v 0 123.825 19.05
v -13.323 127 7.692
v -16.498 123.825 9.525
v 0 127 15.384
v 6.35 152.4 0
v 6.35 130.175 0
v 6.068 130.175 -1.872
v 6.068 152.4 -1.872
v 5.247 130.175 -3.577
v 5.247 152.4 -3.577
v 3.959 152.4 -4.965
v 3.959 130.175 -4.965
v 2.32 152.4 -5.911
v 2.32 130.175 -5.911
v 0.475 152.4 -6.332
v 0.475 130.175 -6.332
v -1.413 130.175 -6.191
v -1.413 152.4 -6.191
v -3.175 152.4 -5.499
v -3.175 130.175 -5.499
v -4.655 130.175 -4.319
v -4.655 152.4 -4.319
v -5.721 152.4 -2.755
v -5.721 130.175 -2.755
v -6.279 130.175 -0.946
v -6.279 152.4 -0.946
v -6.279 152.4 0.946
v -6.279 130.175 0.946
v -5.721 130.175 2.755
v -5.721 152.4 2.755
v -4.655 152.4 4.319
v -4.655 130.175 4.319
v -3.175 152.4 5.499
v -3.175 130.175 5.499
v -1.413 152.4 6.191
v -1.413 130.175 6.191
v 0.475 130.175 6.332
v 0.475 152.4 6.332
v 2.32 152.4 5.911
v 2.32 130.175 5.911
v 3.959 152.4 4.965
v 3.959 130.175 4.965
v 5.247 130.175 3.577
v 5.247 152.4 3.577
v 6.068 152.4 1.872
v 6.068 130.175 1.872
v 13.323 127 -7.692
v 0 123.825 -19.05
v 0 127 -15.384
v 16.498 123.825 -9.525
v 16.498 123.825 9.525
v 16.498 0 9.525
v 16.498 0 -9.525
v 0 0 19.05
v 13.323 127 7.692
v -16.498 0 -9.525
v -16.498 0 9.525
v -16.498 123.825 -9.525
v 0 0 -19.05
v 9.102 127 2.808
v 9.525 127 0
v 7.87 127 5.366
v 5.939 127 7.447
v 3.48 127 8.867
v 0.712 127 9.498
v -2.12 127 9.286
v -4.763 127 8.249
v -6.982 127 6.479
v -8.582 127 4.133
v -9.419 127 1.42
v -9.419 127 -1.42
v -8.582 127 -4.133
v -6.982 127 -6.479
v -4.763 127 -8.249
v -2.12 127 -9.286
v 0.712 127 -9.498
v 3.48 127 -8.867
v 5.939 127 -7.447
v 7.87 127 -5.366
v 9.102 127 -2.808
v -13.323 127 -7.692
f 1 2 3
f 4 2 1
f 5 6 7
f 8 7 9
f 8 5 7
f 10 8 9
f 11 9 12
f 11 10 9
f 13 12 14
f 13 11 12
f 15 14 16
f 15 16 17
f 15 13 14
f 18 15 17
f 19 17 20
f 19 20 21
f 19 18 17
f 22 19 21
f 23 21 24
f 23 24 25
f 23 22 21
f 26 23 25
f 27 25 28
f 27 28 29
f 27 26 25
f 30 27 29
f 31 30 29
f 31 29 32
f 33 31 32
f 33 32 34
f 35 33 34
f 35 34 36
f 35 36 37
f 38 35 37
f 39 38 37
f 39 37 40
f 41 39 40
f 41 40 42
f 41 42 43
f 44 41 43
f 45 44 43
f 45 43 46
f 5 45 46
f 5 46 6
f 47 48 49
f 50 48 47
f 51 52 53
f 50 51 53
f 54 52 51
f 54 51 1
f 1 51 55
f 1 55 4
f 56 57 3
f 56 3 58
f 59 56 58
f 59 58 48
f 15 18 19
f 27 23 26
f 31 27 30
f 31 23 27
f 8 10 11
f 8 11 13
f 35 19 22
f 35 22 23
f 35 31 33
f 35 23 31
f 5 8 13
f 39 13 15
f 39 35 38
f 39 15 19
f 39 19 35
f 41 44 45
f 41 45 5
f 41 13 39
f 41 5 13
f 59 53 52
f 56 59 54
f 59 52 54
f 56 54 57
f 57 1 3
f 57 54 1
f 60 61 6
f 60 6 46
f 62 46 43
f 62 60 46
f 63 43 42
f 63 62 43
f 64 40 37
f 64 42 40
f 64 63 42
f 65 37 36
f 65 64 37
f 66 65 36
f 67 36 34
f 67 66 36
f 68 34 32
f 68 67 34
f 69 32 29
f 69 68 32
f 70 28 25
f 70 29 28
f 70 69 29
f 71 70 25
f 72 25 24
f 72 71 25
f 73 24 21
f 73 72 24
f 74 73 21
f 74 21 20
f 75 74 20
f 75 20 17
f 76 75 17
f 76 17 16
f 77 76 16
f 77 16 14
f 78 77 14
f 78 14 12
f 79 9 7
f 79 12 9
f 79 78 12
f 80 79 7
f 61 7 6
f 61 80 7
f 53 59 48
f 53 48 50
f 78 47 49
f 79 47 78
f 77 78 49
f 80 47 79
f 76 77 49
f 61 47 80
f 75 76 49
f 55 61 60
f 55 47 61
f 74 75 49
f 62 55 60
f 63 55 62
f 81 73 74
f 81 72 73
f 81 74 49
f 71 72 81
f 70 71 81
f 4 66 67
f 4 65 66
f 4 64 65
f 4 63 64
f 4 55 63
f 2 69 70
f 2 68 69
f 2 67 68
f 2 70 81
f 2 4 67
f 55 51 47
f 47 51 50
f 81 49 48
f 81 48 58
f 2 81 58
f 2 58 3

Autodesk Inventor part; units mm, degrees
ref_plane "YZ Plane" through (0, 0, 0) normal (1, 0, 0) x (0, 1, 0)
ref_plane "XZ Plane" through (0, 0, 0) normal (0, 1, 0) x (-1, 0, 0)
sketch "Sketch1" plane through (0, 0, 0) normal (0, 1, 0) x (-1, 0, 0)
  line L0 (16.4978, 9.525) -> (16.4978, -9.525)
  line L1 (16.4978, -9.525) -> (0, -19.05)
  line L2 (0, -19.05) -> (-16.4978, -9.525)
  line L3 (-16.4978, 9.525) -> (-16.4978, -9.525)
  line L4 (-16.4978, 9.525) -> (0, 19.05)
  line L5 (0, 19.05) -> (16.4978, 9.525)
  circle A0 centre (0, 0) radius 19.05 construction
  line L6 (0, 25.4) -> (0, -25.4) construction
  circle A1 centre (0, 0) radius 6.35
  dimension "d0" = 38.1
  dimension "d8" = 12.7
extrude "Hexagon1" add sketch "Sketch1" along normal blind 127 contours L0 L1 L2 L3 L4 L5 | A1
sketch "Sketch2" plane through (0, 127, 0) normal (0, 1, 0) x (1, 0, 0)
  circle A0 centre (0, 0) radius 6.35
  line L0 (0, 0) -> (25.4, 0) construction
  dimension "d3" = 12.7
ref_plane "Work Plane2" through (0, 127, 0) normal (1, 0, 0) x (0, 0, -1)
sketch "Sketch5" plane through (0, 127, 0) normal (1, 0, 0) x (0, 0, -1)
  line L0 (9.525, 0) -> (-9.525, 0) projected
  line L1 (0, 0) -> (0, 25.4)
  point P0 (0, -127)
  dimension "d9" = 25.4
sweep "Sweep1" add profiles "Sketch2" path "Sketch5" path curves L1
chamfer "Chamfer1" distance 3.175 angle 45 7 edges at (8.2489, 127, -14.2875) (-6.35, 127, 0) (16.4978, 127, 0) (8.2489, 127, 14.2875) (-8.2489, 127, -14.2875) (-16.4978, 127, 0) (-8.2489, 127, 14.2875)
properties part number "HexShaft1"
